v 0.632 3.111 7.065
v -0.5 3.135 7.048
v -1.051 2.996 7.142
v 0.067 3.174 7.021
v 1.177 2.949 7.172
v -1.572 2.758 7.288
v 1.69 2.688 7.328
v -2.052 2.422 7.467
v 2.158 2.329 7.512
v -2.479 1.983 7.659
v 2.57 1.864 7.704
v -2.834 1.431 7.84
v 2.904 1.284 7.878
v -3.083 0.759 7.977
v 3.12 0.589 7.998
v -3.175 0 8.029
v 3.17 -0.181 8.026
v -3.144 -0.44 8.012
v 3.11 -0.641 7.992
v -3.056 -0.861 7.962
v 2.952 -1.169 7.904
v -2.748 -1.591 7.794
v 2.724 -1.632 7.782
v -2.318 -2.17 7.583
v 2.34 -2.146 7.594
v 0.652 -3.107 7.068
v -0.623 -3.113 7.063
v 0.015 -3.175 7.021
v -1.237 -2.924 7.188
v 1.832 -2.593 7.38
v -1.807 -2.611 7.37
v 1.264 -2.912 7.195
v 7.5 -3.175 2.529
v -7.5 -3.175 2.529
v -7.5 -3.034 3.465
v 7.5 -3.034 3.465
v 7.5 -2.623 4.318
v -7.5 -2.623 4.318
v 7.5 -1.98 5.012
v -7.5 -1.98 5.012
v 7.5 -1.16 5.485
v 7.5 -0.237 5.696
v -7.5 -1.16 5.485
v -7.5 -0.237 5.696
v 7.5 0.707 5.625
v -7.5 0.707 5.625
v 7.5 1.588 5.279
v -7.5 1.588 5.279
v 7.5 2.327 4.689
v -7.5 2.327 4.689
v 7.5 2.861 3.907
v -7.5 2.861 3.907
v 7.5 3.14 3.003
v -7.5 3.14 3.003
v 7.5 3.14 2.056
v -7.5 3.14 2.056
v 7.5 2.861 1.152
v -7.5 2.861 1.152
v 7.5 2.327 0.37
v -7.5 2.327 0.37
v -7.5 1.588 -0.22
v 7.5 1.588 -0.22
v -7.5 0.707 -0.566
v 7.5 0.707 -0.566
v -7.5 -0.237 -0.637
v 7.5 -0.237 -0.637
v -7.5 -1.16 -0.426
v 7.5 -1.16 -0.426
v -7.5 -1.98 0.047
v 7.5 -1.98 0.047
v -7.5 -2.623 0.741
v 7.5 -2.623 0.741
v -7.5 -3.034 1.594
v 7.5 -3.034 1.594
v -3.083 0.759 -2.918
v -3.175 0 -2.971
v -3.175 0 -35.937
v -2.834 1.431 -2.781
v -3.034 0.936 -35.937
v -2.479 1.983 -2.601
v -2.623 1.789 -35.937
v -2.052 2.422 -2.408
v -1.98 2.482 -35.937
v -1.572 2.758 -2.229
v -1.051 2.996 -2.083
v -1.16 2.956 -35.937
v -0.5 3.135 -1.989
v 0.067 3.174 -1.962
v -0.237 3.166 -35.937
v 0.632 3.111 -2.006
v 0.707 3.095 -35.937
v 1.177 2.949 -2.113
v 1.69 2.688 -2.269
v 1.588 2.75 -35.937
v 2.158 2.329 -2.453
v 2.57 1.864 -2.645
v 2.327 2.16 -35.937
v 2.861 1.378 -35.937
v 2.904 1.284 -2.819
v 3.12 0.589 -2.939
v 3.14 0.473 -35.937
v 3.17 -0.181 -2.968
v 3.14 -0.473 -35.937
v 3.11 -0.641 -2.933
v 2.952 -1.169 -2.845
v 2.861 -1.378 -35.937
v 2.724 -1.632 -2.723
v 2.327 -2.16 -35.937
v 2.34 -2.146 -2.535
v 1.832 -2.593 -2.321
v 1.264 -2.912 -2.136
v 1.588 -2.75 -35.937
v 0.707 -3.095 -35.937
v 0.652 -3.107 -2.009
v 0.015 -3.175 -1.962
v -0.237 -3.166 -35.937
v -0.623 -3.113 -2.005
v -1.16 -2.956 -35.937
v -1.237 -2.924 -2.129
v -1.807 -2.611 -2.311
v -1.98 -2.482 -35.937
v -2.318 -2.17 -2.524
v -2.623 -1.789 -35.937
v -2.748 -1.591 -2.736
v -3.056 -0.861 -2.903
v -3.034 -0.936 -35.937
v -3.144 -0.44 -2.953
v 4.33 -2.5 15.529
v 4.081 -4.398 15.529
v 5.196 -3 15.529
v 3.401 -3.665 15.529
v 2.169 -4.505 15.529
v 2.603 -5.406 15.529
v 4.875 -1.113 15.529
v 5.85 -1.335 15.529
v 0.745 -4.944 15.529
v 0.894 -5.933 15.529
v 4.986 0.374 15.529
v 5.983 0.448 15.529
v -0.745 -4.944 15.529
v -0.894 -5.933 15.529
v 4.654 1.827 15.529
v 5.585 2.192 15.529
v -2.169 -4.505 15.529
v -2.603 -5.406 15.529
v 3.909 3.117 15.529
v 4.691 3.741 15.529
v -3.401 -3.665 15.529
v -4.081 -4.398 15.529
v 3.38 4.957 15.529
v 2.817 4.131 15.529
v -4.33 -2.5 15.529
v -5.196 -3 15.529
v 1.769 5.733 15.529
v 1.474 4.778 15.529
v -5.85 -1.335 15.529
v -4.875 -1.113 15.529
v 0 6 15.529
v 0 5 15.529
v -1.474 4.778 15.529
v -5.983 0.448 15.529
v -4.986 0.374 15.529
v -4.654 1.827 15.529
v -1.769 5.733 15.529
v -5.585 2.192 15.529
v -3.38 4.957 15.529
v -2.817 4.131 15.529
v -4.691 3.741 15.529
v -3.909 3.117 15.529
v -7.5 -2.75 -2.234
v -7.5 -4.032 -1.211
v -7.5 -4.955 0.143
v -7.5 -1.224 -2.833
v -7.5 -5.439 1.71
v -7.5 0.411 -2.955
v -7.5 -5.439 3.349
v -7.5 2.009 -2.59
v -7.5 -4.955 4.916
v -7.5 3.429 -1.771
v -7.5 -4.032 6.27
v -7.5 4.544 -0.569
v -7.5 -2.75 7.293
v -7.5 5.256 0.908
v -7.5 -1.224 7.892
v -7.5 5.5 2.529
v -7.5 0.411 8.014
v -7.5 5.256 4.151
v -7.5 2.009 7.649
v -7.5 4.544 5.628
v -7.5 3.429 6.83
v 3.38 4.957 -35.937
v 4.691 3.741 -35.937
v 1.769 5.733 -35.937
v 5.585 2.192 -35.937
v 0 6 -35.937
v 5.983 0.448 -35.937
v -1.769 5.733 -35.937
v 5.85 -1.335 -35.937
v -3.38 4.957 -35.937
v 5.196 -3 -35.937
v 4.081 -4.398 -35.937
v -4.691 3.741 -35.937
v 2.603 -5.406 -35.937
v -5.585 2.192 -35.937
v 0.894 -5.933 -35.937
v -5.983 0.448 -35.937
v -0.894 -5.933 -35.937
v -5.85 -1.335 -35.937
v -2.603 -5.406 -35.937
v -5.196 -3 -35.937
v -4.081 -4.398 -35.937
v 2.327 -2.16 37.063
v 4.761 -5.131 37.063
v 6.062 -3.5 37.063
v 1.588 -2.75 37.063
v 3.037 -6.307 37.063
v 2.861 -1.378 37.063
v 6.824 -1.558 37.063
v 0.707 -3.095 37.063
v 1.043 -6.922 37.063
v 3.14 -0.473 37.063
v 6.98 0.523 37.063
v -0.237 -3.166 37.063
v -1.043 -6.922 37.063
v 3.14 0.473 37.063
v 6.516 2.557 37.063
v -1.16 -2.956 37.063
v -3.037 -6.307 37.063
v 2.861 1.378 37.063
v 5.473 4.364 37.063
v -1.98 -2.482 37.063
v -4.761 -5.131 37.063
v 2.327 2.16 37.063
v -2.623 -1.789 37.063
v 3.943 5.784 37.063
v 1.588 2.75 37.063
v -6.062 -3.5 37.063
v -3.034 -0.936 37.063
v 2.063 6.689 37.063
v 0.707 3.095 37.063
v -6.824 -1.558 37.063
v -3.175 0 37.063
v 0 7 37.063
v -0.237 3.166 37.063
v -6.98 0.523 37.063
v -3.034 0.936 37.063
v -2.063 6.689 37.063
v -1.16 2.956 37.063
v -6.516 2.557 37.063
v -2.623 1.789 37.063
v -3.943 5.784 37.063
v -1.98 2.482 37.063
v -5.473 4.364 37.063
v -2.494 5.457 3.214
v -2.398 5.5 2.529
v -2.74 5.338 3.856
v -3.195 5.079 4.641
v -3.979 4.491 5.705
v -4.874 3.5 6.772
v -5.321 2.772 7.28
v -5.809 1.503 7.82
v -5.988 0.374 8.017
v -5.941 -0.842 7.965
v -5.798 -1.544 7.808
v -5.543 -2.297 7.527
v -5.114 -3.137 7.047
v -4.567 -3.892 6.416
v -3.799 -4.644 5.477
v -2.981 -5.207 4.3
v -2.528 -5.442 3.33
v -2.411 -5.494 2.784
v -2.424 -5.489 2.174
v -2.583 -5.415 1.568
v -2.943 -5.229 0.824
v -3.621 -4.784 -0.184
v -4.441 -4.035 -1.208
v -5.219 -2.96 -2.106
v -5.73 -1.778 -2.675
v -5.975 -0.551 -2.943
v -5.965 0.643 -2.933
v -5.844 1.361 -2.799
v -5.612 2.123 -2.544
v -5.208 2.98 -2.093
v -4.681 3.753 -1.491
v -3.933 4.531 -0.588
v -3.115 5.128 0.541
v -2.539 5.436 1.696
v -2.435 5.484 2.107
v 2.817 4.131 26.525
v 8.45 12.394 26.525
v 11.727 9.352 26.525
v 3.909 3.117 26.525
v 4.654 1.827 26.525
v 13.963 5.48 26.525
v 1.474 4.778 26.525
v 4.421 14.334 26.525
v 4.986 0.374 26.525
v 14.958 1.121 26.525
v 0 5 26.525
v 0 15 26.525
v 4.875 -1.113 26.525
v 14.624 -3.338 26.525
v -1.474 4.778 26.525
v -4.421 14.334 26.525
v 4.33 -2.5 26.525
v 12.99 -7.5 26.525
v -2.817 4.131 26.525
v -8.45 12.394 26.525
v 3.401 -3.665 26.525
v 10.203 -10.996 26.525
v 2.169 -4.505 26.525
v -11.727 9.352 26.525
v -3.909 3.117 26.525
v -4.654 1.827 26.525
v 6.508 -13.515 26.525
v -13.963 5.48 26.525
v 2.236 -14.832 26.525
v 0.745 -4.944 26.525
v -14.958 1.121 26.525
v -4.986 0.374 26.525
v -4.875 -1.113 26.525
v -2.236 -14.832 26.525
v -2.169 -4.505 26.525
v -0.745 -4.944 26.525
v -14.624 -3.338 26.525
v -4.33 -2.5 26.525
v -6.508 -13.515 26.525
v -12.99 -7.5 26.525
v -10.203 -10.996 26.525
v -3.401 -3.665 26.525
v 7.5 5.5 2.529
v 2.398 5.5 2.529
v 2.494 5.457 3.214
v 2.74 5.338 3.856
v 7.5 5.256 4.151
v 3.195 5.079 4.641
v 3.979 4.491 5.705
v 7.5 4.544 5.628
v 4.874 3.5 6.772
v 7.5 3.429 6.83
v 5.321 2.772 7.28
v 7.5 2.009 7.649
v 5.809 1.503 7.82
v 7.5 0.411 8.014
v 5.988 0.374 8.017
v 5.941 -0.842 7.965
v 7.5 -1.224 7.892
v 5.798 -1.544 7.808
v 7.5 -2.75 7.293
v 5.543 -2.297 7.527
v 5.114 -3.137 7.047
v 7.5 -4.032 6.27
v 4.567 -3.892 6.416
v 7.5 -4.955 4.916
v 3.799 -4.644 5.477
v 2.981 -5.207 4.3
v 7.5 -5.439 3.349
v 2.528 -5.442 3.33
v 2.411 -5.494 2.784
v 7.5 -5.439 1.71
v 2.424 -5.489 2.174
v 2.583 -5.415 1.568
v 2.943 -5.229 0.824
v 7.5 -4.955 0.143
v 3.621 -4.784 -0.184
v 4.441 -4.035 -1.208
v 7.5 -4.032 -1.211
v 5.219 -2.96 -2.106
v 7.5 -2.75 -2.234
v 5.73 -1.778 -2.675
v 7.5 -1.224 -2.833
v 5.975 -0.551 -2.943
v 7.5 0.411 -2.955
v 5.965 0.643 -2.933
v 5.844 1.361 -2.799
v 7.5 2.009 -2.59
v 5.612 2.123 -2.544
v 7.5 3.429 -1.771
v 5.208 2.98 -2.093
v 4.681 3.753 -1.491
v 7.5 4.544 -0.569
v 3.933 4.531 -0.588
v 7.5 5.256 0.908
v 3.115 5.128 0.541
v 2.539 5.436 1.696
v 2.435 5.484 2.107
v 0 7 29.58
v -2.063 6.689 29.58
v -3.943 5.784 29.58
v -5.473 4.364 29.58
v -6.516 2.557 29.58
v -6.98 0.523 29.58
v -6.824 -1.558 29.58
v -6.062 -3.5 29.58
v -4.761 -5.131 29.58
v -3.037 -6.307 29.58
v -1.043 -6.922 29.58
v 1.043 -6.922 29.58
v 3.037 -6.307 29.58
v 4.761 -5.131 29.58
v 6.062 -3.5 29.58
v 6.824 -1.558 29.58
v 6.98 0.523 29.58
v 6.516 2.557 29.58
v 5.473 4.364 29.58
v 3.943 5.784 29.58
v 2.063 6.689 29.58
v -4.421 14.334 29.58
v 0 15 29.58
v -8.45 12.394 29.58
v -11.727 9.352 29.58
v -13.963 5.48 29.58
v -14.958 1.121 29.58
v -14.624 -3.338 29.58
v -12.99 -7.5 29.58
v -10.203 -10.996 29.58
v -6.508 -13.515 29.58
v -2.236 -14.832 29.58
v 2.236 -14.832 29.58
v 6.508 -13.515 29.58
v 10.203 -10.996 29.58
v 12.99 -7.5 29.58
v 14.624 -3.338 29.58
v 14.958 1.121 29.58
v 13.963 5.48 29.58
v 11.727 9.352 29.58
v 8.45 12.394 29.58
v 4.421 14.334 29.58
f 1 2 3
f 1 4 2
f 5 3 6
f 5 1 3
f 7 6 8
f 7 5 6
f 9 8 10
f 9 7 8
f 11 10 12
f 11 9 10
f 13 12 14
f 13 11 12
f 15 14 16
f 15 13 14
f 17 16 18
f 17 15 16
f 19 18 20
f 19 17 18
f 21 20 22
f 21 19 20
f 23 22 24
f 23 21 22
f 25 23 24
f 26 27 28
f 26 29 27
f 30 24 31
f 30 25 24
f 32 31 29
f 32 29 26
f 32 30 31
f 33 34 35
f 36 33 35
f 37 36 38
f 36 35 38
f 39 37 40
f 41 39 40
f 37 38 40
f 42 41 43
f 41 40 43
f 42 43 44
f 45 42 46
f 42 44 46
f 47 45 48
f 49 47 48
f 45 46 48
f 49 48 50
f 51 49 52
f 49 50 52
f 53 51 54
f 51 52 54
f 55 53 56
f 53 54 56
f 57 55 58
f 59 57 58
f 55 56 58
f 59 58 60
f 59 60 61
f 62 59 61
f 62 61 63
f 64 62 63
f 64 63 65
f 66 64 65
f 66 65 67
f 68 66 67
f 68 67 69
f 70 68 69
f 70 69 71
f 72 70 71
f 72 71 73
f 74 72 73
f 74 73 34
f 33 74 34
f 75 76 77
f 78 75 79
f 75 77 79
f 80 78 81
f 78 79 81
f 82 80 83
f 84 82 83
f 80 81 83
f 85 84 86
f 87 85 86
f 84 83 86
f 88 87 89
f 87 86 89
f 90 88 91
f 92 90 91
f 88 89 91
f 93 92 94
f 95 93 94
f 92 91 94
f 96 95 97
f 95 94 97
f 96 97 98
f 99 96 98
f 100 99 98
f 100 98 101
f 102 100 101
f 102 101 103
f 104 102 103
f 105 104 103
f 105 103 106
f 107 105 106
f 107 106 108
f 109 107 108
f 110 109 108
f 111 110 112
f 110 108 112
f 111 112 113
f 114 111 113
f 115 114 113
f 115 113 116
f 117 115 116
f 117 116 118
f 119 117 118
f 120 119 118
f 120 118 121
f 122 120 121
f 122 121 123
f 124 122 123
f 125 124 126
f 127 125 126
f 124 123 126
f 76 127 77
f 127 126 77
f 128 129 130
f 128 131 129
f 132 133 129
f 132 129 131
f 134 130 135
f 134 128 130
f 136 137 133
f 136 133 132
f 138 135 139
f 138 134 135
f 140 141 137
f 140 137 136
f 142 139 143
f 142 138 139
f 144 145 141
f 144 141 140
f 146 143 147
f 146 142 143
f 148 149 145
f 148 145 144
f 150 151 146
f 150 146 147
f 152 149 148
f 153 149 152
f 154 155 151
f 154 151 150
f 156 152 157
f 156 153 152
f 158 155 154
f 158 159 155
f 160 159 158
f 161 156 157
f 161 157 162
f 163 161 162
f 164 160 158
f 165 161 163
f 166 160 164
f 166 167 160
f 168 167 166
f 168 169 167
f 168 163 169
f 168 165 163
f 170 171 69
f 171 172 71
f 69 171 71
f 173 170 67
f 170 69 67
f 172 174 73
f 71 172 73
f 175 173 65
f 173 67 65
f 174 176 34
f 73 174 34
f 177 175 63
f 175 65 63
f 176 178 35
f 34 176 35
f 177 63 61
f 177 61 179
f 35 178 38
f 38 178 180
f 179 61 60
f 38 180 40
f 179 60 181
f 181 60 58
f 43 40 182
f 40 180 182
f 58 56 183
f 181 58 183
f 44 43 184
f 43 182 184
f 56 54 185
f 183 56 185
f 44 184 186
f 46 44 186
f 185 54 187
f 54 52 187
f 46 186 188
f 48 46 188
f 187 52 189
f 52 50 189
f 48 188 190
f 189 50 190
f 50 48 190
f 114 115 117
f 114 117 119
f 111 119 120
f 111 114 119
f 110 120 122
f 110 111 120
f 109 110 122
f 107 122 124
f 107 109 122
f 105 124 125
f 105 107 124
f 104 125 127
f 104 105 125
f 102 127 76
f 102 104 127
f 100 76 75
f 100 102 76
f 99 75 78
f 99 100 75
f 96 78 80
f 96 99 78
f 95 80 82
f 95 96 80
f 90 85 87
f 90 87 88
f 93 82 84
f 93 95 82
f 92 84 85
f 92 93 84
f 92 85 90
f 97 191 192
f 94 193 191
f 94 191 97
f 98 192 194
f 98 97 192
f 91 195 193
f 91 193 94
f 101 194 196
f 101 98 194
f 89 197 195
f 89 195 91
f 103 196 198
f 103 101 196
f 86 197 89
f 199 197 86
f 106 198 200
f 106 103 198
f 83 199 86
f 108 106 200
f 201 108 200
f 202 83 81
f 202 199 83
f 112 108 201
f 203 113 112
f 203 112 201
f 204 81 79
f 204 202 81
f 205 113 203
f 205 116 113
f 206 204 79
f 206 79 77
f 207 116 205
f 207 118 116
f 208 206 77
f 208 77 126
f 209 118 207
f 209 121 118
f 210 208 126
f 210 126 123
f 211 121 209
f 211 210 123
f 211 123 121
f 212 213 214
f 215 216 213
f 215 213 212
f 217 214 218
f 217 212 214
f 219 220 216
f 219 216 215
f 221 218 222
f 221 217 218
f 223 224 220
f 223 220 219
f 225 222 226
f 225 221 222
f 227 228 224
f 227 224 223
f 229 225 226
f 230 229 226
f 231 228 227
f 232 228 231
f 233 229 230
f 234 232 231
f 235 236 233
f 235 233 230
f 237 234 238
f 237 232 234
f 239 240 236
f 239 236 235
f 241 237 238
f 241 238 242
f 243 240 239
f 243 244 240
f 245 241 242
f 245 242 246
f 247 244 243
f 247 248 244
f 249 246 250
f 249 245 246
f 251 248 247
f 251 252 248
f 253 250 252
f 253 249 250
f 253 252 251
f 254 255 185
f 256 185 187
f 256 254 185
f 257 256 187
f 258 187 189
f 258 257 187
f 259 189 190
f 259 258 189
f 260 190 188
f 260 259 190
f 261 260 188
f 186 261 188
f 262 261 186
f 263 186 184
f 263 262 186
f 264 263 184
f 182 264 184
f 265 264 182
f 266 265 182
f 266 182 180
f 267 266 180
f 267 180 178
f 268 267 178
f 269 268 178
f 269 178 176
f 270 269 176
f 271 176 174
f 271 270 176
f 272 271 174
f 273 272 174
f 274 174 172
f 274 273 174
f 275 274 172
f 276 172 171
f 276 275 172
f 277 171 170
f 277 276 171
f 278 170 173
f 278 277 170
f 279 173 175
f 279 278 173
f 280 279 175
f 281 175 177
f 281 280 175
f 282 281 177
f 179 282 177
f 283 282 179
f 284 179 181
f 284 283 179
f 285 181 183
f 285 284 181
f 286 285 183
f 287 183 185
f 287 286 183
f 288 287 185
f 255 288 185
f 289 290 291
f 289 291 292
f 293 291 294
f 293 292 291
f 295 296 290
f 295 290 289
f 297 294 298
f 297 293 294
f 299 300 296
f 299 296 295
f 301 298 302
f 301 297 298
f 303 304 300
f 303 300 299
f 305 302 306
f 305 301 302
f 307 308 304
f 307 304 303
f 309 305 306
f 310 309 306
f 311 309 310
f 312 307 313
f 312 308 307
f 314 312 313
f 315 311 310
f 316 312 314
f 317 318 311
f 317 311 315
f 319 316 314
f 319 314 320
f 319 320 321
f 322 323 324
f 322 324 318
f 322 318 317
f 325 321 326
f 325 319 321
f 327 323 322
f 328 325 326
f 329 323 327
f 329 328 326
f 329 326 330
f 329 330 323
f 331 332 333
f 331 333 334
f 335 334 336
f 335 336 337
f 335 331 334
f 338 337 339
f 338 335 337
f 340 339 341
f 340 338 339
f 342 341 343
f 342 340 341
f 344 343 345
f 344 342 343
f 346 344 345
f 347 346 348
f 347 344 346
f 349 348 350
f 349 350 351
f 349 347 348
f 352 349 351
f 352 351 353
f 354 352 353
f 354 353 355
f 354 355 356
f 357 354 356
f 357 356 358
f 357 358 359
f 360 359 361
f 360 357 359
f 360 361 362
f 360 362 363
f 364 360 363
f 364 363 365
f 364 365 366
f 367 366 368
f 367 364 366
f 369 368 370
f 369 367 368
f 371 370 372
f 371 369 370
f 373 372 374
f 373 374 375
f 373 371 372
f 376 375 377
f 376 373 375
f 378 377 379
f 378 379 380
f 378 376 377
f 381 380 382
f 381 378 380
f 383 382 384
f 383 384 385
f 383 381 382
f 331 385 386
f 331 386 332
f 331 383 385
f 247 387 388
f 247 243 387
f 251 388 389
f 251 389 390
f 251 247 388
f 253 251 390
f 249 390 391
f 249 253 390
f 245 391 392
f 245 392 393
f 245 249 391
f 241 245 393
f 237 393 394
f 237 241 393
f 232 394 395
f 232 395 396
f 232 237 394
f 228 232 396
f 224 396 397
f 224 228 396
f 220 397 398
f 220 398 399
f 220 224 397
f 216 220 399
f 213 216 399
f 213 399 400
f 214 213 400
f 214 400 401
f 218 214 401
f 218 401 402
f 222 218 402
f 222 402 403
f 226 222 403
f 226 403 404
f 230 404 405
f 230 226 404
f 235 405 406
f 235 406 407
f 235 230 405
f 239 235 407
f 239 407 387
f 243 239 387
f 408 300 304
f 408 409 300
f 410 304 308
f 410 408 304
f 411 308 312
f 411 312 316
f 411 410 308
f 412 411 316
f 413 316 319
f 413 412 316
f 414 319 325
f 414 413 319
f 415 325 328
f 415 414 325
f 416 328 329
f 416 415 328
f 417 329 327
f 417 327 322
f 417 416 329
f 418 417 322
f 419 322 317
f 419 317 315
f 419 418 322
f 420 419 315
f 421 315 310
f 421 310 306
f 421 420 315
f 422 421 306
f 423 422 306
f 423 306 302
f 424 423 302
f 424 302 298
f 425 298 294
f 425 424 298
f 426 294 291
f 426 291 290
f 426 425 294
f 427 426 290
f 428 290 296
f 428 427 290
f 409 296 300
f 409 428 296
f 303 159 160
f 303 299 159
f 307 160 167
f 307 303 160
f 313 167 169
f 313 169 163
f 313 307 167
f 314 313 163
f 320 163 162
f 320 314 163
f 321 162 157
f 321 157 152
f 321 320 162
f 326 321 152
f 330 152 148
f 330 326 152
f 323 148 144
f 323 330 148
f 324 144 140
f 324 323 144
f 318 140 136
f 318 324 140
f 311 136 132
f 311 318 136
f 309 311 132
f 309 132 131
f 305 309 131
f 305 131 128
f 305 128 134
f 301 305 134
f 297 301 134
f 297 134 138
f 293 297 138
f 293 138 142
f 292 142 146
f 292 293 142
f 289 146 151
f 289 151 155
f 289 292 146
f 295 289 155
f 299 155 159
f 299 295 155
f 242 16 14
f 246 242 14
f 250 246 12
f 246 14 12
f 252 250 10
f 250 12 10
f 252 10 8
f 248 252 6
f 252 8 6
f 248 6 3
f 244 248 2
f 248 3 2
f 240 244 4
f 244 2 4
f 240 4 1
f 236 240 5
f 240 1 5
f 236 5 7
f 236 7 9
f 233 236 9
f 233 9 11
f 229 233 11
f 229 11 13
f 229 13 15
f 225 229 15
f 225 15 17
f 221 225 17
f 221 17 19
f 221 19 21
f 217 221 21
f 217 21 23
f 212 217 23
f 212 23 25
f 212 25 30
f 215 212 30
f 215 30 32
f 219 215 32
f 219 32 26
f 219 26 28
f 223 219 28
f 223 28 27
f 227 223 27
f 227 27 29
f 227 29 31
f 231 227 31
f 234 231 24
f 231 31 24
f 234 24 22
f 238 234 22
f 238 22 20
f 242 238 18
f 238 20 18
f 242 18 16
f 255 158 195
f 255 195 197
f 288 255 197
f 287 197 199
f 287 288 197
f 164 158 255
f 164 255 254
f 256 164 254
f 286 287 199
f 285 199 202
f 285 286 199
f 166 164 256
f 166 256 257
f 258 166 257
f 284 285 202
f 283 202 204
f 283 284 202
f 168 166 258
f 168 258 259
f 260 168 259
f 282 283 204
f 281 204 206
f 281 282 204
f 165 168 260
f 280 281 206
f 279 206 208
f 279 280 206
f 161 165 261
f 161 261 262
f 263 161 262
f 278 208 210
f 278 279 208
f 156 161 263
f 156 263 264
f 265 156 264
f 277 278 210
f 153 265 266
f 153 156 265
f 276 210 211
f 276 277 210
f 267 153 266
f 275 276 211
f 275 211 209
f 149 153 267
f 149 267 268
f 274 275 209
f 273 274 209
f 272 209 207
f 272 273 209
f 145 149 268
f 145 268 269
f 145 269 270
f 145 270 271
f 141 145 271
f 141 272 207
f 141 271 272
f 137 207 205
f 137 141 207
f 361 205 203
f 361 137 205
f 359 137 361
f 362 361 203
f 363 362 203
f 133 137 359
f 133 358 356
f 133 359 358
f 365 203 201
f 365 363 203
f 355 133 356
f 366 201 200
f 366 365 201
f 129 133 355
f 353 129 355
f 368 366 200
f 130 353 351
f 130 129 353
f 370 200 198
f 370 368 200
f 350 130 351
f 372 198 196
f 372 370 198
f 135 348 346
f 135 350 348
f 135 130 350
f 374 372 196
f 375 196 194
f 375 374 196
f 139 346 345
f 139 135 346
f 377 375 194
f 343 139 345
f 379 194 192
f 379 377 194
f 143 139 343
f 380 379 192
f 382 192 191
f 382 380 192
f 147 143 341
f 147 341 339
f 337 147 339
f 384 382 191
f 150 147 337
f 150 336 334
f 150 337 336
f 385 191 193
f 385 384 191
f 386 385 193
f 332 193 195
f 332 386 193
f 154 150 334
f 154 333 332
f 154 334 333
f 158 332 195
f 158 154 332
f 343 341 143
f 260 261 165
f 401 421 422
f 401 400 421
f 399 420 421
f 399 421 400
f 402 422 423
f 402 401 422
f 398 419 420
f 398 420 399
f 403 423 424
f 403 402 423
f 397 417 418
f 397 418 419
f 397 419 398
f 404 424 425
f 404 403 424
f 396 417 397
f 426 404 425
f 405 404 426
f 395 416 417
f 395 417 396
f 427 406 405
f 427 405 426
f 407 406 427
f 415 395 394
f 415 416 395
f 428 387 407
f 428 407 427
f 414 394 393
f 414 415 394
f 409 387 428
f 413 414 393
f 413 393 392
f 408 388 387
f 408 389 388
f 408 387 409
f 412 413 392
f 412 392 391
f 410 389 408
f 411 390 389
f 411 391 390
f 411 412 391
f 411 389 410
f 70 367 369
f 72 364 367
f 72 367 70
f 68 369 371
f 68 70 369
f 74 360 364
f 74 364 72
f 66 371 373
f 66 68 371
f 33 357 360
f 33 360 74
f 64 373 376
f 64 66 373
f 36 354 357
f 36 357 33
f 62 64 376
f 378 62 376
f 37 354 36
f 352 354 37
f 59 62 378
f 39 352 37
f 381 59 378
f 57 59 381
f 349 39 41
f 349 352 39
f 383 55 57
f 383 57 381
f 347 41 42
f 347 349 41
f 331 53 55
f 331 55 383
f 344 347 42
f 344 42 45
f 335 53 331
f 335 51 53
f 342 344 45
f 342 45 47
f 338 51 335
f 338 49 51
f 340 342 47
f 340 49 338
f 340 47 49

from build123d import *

# Parameters (mm, degrees)
F3_D     = 6.35
F4_R     = 5.5
F5_DEPTH = 7.5
F7_D     = 6.35


with BuildPart() as f1:
    # F0 (on Right) → F1 (revolve)
    with BuildSketch(Plane.YZ):
        Polygon((0, 37.062926), (0, -35.937074), (6, -35.937074), (6, 15.529456), (5, 15.529456), (5, 26.525273), (15, 26.525273), (15, 29.579665), (7, 29.579665), (7, 37.062926), align=None)
    revolve(axis=Axis((0, 0, 0.562926), (0, 0, 1)))

    # F3 (through all)
    with Locations(Plane.XY.offset(37.062926)):
        with Locations((0, 0)):
            Hole(F3_D / 2)

    # F4 (on Right) → F5 (join, symmetric)
    with BuildSketch(Plane.YZ):
        with Locations((0, 2.529456)):
            Circle(F4_R)
    extrude(amount=F5_DEPTH, both=True)

    # F7 (through all)
    with Locations(Plane.YZ.offset(7.5)):
        with Locations((0, 2.529456)):
            Hole(F7_D / 2)


solid = f1.part
